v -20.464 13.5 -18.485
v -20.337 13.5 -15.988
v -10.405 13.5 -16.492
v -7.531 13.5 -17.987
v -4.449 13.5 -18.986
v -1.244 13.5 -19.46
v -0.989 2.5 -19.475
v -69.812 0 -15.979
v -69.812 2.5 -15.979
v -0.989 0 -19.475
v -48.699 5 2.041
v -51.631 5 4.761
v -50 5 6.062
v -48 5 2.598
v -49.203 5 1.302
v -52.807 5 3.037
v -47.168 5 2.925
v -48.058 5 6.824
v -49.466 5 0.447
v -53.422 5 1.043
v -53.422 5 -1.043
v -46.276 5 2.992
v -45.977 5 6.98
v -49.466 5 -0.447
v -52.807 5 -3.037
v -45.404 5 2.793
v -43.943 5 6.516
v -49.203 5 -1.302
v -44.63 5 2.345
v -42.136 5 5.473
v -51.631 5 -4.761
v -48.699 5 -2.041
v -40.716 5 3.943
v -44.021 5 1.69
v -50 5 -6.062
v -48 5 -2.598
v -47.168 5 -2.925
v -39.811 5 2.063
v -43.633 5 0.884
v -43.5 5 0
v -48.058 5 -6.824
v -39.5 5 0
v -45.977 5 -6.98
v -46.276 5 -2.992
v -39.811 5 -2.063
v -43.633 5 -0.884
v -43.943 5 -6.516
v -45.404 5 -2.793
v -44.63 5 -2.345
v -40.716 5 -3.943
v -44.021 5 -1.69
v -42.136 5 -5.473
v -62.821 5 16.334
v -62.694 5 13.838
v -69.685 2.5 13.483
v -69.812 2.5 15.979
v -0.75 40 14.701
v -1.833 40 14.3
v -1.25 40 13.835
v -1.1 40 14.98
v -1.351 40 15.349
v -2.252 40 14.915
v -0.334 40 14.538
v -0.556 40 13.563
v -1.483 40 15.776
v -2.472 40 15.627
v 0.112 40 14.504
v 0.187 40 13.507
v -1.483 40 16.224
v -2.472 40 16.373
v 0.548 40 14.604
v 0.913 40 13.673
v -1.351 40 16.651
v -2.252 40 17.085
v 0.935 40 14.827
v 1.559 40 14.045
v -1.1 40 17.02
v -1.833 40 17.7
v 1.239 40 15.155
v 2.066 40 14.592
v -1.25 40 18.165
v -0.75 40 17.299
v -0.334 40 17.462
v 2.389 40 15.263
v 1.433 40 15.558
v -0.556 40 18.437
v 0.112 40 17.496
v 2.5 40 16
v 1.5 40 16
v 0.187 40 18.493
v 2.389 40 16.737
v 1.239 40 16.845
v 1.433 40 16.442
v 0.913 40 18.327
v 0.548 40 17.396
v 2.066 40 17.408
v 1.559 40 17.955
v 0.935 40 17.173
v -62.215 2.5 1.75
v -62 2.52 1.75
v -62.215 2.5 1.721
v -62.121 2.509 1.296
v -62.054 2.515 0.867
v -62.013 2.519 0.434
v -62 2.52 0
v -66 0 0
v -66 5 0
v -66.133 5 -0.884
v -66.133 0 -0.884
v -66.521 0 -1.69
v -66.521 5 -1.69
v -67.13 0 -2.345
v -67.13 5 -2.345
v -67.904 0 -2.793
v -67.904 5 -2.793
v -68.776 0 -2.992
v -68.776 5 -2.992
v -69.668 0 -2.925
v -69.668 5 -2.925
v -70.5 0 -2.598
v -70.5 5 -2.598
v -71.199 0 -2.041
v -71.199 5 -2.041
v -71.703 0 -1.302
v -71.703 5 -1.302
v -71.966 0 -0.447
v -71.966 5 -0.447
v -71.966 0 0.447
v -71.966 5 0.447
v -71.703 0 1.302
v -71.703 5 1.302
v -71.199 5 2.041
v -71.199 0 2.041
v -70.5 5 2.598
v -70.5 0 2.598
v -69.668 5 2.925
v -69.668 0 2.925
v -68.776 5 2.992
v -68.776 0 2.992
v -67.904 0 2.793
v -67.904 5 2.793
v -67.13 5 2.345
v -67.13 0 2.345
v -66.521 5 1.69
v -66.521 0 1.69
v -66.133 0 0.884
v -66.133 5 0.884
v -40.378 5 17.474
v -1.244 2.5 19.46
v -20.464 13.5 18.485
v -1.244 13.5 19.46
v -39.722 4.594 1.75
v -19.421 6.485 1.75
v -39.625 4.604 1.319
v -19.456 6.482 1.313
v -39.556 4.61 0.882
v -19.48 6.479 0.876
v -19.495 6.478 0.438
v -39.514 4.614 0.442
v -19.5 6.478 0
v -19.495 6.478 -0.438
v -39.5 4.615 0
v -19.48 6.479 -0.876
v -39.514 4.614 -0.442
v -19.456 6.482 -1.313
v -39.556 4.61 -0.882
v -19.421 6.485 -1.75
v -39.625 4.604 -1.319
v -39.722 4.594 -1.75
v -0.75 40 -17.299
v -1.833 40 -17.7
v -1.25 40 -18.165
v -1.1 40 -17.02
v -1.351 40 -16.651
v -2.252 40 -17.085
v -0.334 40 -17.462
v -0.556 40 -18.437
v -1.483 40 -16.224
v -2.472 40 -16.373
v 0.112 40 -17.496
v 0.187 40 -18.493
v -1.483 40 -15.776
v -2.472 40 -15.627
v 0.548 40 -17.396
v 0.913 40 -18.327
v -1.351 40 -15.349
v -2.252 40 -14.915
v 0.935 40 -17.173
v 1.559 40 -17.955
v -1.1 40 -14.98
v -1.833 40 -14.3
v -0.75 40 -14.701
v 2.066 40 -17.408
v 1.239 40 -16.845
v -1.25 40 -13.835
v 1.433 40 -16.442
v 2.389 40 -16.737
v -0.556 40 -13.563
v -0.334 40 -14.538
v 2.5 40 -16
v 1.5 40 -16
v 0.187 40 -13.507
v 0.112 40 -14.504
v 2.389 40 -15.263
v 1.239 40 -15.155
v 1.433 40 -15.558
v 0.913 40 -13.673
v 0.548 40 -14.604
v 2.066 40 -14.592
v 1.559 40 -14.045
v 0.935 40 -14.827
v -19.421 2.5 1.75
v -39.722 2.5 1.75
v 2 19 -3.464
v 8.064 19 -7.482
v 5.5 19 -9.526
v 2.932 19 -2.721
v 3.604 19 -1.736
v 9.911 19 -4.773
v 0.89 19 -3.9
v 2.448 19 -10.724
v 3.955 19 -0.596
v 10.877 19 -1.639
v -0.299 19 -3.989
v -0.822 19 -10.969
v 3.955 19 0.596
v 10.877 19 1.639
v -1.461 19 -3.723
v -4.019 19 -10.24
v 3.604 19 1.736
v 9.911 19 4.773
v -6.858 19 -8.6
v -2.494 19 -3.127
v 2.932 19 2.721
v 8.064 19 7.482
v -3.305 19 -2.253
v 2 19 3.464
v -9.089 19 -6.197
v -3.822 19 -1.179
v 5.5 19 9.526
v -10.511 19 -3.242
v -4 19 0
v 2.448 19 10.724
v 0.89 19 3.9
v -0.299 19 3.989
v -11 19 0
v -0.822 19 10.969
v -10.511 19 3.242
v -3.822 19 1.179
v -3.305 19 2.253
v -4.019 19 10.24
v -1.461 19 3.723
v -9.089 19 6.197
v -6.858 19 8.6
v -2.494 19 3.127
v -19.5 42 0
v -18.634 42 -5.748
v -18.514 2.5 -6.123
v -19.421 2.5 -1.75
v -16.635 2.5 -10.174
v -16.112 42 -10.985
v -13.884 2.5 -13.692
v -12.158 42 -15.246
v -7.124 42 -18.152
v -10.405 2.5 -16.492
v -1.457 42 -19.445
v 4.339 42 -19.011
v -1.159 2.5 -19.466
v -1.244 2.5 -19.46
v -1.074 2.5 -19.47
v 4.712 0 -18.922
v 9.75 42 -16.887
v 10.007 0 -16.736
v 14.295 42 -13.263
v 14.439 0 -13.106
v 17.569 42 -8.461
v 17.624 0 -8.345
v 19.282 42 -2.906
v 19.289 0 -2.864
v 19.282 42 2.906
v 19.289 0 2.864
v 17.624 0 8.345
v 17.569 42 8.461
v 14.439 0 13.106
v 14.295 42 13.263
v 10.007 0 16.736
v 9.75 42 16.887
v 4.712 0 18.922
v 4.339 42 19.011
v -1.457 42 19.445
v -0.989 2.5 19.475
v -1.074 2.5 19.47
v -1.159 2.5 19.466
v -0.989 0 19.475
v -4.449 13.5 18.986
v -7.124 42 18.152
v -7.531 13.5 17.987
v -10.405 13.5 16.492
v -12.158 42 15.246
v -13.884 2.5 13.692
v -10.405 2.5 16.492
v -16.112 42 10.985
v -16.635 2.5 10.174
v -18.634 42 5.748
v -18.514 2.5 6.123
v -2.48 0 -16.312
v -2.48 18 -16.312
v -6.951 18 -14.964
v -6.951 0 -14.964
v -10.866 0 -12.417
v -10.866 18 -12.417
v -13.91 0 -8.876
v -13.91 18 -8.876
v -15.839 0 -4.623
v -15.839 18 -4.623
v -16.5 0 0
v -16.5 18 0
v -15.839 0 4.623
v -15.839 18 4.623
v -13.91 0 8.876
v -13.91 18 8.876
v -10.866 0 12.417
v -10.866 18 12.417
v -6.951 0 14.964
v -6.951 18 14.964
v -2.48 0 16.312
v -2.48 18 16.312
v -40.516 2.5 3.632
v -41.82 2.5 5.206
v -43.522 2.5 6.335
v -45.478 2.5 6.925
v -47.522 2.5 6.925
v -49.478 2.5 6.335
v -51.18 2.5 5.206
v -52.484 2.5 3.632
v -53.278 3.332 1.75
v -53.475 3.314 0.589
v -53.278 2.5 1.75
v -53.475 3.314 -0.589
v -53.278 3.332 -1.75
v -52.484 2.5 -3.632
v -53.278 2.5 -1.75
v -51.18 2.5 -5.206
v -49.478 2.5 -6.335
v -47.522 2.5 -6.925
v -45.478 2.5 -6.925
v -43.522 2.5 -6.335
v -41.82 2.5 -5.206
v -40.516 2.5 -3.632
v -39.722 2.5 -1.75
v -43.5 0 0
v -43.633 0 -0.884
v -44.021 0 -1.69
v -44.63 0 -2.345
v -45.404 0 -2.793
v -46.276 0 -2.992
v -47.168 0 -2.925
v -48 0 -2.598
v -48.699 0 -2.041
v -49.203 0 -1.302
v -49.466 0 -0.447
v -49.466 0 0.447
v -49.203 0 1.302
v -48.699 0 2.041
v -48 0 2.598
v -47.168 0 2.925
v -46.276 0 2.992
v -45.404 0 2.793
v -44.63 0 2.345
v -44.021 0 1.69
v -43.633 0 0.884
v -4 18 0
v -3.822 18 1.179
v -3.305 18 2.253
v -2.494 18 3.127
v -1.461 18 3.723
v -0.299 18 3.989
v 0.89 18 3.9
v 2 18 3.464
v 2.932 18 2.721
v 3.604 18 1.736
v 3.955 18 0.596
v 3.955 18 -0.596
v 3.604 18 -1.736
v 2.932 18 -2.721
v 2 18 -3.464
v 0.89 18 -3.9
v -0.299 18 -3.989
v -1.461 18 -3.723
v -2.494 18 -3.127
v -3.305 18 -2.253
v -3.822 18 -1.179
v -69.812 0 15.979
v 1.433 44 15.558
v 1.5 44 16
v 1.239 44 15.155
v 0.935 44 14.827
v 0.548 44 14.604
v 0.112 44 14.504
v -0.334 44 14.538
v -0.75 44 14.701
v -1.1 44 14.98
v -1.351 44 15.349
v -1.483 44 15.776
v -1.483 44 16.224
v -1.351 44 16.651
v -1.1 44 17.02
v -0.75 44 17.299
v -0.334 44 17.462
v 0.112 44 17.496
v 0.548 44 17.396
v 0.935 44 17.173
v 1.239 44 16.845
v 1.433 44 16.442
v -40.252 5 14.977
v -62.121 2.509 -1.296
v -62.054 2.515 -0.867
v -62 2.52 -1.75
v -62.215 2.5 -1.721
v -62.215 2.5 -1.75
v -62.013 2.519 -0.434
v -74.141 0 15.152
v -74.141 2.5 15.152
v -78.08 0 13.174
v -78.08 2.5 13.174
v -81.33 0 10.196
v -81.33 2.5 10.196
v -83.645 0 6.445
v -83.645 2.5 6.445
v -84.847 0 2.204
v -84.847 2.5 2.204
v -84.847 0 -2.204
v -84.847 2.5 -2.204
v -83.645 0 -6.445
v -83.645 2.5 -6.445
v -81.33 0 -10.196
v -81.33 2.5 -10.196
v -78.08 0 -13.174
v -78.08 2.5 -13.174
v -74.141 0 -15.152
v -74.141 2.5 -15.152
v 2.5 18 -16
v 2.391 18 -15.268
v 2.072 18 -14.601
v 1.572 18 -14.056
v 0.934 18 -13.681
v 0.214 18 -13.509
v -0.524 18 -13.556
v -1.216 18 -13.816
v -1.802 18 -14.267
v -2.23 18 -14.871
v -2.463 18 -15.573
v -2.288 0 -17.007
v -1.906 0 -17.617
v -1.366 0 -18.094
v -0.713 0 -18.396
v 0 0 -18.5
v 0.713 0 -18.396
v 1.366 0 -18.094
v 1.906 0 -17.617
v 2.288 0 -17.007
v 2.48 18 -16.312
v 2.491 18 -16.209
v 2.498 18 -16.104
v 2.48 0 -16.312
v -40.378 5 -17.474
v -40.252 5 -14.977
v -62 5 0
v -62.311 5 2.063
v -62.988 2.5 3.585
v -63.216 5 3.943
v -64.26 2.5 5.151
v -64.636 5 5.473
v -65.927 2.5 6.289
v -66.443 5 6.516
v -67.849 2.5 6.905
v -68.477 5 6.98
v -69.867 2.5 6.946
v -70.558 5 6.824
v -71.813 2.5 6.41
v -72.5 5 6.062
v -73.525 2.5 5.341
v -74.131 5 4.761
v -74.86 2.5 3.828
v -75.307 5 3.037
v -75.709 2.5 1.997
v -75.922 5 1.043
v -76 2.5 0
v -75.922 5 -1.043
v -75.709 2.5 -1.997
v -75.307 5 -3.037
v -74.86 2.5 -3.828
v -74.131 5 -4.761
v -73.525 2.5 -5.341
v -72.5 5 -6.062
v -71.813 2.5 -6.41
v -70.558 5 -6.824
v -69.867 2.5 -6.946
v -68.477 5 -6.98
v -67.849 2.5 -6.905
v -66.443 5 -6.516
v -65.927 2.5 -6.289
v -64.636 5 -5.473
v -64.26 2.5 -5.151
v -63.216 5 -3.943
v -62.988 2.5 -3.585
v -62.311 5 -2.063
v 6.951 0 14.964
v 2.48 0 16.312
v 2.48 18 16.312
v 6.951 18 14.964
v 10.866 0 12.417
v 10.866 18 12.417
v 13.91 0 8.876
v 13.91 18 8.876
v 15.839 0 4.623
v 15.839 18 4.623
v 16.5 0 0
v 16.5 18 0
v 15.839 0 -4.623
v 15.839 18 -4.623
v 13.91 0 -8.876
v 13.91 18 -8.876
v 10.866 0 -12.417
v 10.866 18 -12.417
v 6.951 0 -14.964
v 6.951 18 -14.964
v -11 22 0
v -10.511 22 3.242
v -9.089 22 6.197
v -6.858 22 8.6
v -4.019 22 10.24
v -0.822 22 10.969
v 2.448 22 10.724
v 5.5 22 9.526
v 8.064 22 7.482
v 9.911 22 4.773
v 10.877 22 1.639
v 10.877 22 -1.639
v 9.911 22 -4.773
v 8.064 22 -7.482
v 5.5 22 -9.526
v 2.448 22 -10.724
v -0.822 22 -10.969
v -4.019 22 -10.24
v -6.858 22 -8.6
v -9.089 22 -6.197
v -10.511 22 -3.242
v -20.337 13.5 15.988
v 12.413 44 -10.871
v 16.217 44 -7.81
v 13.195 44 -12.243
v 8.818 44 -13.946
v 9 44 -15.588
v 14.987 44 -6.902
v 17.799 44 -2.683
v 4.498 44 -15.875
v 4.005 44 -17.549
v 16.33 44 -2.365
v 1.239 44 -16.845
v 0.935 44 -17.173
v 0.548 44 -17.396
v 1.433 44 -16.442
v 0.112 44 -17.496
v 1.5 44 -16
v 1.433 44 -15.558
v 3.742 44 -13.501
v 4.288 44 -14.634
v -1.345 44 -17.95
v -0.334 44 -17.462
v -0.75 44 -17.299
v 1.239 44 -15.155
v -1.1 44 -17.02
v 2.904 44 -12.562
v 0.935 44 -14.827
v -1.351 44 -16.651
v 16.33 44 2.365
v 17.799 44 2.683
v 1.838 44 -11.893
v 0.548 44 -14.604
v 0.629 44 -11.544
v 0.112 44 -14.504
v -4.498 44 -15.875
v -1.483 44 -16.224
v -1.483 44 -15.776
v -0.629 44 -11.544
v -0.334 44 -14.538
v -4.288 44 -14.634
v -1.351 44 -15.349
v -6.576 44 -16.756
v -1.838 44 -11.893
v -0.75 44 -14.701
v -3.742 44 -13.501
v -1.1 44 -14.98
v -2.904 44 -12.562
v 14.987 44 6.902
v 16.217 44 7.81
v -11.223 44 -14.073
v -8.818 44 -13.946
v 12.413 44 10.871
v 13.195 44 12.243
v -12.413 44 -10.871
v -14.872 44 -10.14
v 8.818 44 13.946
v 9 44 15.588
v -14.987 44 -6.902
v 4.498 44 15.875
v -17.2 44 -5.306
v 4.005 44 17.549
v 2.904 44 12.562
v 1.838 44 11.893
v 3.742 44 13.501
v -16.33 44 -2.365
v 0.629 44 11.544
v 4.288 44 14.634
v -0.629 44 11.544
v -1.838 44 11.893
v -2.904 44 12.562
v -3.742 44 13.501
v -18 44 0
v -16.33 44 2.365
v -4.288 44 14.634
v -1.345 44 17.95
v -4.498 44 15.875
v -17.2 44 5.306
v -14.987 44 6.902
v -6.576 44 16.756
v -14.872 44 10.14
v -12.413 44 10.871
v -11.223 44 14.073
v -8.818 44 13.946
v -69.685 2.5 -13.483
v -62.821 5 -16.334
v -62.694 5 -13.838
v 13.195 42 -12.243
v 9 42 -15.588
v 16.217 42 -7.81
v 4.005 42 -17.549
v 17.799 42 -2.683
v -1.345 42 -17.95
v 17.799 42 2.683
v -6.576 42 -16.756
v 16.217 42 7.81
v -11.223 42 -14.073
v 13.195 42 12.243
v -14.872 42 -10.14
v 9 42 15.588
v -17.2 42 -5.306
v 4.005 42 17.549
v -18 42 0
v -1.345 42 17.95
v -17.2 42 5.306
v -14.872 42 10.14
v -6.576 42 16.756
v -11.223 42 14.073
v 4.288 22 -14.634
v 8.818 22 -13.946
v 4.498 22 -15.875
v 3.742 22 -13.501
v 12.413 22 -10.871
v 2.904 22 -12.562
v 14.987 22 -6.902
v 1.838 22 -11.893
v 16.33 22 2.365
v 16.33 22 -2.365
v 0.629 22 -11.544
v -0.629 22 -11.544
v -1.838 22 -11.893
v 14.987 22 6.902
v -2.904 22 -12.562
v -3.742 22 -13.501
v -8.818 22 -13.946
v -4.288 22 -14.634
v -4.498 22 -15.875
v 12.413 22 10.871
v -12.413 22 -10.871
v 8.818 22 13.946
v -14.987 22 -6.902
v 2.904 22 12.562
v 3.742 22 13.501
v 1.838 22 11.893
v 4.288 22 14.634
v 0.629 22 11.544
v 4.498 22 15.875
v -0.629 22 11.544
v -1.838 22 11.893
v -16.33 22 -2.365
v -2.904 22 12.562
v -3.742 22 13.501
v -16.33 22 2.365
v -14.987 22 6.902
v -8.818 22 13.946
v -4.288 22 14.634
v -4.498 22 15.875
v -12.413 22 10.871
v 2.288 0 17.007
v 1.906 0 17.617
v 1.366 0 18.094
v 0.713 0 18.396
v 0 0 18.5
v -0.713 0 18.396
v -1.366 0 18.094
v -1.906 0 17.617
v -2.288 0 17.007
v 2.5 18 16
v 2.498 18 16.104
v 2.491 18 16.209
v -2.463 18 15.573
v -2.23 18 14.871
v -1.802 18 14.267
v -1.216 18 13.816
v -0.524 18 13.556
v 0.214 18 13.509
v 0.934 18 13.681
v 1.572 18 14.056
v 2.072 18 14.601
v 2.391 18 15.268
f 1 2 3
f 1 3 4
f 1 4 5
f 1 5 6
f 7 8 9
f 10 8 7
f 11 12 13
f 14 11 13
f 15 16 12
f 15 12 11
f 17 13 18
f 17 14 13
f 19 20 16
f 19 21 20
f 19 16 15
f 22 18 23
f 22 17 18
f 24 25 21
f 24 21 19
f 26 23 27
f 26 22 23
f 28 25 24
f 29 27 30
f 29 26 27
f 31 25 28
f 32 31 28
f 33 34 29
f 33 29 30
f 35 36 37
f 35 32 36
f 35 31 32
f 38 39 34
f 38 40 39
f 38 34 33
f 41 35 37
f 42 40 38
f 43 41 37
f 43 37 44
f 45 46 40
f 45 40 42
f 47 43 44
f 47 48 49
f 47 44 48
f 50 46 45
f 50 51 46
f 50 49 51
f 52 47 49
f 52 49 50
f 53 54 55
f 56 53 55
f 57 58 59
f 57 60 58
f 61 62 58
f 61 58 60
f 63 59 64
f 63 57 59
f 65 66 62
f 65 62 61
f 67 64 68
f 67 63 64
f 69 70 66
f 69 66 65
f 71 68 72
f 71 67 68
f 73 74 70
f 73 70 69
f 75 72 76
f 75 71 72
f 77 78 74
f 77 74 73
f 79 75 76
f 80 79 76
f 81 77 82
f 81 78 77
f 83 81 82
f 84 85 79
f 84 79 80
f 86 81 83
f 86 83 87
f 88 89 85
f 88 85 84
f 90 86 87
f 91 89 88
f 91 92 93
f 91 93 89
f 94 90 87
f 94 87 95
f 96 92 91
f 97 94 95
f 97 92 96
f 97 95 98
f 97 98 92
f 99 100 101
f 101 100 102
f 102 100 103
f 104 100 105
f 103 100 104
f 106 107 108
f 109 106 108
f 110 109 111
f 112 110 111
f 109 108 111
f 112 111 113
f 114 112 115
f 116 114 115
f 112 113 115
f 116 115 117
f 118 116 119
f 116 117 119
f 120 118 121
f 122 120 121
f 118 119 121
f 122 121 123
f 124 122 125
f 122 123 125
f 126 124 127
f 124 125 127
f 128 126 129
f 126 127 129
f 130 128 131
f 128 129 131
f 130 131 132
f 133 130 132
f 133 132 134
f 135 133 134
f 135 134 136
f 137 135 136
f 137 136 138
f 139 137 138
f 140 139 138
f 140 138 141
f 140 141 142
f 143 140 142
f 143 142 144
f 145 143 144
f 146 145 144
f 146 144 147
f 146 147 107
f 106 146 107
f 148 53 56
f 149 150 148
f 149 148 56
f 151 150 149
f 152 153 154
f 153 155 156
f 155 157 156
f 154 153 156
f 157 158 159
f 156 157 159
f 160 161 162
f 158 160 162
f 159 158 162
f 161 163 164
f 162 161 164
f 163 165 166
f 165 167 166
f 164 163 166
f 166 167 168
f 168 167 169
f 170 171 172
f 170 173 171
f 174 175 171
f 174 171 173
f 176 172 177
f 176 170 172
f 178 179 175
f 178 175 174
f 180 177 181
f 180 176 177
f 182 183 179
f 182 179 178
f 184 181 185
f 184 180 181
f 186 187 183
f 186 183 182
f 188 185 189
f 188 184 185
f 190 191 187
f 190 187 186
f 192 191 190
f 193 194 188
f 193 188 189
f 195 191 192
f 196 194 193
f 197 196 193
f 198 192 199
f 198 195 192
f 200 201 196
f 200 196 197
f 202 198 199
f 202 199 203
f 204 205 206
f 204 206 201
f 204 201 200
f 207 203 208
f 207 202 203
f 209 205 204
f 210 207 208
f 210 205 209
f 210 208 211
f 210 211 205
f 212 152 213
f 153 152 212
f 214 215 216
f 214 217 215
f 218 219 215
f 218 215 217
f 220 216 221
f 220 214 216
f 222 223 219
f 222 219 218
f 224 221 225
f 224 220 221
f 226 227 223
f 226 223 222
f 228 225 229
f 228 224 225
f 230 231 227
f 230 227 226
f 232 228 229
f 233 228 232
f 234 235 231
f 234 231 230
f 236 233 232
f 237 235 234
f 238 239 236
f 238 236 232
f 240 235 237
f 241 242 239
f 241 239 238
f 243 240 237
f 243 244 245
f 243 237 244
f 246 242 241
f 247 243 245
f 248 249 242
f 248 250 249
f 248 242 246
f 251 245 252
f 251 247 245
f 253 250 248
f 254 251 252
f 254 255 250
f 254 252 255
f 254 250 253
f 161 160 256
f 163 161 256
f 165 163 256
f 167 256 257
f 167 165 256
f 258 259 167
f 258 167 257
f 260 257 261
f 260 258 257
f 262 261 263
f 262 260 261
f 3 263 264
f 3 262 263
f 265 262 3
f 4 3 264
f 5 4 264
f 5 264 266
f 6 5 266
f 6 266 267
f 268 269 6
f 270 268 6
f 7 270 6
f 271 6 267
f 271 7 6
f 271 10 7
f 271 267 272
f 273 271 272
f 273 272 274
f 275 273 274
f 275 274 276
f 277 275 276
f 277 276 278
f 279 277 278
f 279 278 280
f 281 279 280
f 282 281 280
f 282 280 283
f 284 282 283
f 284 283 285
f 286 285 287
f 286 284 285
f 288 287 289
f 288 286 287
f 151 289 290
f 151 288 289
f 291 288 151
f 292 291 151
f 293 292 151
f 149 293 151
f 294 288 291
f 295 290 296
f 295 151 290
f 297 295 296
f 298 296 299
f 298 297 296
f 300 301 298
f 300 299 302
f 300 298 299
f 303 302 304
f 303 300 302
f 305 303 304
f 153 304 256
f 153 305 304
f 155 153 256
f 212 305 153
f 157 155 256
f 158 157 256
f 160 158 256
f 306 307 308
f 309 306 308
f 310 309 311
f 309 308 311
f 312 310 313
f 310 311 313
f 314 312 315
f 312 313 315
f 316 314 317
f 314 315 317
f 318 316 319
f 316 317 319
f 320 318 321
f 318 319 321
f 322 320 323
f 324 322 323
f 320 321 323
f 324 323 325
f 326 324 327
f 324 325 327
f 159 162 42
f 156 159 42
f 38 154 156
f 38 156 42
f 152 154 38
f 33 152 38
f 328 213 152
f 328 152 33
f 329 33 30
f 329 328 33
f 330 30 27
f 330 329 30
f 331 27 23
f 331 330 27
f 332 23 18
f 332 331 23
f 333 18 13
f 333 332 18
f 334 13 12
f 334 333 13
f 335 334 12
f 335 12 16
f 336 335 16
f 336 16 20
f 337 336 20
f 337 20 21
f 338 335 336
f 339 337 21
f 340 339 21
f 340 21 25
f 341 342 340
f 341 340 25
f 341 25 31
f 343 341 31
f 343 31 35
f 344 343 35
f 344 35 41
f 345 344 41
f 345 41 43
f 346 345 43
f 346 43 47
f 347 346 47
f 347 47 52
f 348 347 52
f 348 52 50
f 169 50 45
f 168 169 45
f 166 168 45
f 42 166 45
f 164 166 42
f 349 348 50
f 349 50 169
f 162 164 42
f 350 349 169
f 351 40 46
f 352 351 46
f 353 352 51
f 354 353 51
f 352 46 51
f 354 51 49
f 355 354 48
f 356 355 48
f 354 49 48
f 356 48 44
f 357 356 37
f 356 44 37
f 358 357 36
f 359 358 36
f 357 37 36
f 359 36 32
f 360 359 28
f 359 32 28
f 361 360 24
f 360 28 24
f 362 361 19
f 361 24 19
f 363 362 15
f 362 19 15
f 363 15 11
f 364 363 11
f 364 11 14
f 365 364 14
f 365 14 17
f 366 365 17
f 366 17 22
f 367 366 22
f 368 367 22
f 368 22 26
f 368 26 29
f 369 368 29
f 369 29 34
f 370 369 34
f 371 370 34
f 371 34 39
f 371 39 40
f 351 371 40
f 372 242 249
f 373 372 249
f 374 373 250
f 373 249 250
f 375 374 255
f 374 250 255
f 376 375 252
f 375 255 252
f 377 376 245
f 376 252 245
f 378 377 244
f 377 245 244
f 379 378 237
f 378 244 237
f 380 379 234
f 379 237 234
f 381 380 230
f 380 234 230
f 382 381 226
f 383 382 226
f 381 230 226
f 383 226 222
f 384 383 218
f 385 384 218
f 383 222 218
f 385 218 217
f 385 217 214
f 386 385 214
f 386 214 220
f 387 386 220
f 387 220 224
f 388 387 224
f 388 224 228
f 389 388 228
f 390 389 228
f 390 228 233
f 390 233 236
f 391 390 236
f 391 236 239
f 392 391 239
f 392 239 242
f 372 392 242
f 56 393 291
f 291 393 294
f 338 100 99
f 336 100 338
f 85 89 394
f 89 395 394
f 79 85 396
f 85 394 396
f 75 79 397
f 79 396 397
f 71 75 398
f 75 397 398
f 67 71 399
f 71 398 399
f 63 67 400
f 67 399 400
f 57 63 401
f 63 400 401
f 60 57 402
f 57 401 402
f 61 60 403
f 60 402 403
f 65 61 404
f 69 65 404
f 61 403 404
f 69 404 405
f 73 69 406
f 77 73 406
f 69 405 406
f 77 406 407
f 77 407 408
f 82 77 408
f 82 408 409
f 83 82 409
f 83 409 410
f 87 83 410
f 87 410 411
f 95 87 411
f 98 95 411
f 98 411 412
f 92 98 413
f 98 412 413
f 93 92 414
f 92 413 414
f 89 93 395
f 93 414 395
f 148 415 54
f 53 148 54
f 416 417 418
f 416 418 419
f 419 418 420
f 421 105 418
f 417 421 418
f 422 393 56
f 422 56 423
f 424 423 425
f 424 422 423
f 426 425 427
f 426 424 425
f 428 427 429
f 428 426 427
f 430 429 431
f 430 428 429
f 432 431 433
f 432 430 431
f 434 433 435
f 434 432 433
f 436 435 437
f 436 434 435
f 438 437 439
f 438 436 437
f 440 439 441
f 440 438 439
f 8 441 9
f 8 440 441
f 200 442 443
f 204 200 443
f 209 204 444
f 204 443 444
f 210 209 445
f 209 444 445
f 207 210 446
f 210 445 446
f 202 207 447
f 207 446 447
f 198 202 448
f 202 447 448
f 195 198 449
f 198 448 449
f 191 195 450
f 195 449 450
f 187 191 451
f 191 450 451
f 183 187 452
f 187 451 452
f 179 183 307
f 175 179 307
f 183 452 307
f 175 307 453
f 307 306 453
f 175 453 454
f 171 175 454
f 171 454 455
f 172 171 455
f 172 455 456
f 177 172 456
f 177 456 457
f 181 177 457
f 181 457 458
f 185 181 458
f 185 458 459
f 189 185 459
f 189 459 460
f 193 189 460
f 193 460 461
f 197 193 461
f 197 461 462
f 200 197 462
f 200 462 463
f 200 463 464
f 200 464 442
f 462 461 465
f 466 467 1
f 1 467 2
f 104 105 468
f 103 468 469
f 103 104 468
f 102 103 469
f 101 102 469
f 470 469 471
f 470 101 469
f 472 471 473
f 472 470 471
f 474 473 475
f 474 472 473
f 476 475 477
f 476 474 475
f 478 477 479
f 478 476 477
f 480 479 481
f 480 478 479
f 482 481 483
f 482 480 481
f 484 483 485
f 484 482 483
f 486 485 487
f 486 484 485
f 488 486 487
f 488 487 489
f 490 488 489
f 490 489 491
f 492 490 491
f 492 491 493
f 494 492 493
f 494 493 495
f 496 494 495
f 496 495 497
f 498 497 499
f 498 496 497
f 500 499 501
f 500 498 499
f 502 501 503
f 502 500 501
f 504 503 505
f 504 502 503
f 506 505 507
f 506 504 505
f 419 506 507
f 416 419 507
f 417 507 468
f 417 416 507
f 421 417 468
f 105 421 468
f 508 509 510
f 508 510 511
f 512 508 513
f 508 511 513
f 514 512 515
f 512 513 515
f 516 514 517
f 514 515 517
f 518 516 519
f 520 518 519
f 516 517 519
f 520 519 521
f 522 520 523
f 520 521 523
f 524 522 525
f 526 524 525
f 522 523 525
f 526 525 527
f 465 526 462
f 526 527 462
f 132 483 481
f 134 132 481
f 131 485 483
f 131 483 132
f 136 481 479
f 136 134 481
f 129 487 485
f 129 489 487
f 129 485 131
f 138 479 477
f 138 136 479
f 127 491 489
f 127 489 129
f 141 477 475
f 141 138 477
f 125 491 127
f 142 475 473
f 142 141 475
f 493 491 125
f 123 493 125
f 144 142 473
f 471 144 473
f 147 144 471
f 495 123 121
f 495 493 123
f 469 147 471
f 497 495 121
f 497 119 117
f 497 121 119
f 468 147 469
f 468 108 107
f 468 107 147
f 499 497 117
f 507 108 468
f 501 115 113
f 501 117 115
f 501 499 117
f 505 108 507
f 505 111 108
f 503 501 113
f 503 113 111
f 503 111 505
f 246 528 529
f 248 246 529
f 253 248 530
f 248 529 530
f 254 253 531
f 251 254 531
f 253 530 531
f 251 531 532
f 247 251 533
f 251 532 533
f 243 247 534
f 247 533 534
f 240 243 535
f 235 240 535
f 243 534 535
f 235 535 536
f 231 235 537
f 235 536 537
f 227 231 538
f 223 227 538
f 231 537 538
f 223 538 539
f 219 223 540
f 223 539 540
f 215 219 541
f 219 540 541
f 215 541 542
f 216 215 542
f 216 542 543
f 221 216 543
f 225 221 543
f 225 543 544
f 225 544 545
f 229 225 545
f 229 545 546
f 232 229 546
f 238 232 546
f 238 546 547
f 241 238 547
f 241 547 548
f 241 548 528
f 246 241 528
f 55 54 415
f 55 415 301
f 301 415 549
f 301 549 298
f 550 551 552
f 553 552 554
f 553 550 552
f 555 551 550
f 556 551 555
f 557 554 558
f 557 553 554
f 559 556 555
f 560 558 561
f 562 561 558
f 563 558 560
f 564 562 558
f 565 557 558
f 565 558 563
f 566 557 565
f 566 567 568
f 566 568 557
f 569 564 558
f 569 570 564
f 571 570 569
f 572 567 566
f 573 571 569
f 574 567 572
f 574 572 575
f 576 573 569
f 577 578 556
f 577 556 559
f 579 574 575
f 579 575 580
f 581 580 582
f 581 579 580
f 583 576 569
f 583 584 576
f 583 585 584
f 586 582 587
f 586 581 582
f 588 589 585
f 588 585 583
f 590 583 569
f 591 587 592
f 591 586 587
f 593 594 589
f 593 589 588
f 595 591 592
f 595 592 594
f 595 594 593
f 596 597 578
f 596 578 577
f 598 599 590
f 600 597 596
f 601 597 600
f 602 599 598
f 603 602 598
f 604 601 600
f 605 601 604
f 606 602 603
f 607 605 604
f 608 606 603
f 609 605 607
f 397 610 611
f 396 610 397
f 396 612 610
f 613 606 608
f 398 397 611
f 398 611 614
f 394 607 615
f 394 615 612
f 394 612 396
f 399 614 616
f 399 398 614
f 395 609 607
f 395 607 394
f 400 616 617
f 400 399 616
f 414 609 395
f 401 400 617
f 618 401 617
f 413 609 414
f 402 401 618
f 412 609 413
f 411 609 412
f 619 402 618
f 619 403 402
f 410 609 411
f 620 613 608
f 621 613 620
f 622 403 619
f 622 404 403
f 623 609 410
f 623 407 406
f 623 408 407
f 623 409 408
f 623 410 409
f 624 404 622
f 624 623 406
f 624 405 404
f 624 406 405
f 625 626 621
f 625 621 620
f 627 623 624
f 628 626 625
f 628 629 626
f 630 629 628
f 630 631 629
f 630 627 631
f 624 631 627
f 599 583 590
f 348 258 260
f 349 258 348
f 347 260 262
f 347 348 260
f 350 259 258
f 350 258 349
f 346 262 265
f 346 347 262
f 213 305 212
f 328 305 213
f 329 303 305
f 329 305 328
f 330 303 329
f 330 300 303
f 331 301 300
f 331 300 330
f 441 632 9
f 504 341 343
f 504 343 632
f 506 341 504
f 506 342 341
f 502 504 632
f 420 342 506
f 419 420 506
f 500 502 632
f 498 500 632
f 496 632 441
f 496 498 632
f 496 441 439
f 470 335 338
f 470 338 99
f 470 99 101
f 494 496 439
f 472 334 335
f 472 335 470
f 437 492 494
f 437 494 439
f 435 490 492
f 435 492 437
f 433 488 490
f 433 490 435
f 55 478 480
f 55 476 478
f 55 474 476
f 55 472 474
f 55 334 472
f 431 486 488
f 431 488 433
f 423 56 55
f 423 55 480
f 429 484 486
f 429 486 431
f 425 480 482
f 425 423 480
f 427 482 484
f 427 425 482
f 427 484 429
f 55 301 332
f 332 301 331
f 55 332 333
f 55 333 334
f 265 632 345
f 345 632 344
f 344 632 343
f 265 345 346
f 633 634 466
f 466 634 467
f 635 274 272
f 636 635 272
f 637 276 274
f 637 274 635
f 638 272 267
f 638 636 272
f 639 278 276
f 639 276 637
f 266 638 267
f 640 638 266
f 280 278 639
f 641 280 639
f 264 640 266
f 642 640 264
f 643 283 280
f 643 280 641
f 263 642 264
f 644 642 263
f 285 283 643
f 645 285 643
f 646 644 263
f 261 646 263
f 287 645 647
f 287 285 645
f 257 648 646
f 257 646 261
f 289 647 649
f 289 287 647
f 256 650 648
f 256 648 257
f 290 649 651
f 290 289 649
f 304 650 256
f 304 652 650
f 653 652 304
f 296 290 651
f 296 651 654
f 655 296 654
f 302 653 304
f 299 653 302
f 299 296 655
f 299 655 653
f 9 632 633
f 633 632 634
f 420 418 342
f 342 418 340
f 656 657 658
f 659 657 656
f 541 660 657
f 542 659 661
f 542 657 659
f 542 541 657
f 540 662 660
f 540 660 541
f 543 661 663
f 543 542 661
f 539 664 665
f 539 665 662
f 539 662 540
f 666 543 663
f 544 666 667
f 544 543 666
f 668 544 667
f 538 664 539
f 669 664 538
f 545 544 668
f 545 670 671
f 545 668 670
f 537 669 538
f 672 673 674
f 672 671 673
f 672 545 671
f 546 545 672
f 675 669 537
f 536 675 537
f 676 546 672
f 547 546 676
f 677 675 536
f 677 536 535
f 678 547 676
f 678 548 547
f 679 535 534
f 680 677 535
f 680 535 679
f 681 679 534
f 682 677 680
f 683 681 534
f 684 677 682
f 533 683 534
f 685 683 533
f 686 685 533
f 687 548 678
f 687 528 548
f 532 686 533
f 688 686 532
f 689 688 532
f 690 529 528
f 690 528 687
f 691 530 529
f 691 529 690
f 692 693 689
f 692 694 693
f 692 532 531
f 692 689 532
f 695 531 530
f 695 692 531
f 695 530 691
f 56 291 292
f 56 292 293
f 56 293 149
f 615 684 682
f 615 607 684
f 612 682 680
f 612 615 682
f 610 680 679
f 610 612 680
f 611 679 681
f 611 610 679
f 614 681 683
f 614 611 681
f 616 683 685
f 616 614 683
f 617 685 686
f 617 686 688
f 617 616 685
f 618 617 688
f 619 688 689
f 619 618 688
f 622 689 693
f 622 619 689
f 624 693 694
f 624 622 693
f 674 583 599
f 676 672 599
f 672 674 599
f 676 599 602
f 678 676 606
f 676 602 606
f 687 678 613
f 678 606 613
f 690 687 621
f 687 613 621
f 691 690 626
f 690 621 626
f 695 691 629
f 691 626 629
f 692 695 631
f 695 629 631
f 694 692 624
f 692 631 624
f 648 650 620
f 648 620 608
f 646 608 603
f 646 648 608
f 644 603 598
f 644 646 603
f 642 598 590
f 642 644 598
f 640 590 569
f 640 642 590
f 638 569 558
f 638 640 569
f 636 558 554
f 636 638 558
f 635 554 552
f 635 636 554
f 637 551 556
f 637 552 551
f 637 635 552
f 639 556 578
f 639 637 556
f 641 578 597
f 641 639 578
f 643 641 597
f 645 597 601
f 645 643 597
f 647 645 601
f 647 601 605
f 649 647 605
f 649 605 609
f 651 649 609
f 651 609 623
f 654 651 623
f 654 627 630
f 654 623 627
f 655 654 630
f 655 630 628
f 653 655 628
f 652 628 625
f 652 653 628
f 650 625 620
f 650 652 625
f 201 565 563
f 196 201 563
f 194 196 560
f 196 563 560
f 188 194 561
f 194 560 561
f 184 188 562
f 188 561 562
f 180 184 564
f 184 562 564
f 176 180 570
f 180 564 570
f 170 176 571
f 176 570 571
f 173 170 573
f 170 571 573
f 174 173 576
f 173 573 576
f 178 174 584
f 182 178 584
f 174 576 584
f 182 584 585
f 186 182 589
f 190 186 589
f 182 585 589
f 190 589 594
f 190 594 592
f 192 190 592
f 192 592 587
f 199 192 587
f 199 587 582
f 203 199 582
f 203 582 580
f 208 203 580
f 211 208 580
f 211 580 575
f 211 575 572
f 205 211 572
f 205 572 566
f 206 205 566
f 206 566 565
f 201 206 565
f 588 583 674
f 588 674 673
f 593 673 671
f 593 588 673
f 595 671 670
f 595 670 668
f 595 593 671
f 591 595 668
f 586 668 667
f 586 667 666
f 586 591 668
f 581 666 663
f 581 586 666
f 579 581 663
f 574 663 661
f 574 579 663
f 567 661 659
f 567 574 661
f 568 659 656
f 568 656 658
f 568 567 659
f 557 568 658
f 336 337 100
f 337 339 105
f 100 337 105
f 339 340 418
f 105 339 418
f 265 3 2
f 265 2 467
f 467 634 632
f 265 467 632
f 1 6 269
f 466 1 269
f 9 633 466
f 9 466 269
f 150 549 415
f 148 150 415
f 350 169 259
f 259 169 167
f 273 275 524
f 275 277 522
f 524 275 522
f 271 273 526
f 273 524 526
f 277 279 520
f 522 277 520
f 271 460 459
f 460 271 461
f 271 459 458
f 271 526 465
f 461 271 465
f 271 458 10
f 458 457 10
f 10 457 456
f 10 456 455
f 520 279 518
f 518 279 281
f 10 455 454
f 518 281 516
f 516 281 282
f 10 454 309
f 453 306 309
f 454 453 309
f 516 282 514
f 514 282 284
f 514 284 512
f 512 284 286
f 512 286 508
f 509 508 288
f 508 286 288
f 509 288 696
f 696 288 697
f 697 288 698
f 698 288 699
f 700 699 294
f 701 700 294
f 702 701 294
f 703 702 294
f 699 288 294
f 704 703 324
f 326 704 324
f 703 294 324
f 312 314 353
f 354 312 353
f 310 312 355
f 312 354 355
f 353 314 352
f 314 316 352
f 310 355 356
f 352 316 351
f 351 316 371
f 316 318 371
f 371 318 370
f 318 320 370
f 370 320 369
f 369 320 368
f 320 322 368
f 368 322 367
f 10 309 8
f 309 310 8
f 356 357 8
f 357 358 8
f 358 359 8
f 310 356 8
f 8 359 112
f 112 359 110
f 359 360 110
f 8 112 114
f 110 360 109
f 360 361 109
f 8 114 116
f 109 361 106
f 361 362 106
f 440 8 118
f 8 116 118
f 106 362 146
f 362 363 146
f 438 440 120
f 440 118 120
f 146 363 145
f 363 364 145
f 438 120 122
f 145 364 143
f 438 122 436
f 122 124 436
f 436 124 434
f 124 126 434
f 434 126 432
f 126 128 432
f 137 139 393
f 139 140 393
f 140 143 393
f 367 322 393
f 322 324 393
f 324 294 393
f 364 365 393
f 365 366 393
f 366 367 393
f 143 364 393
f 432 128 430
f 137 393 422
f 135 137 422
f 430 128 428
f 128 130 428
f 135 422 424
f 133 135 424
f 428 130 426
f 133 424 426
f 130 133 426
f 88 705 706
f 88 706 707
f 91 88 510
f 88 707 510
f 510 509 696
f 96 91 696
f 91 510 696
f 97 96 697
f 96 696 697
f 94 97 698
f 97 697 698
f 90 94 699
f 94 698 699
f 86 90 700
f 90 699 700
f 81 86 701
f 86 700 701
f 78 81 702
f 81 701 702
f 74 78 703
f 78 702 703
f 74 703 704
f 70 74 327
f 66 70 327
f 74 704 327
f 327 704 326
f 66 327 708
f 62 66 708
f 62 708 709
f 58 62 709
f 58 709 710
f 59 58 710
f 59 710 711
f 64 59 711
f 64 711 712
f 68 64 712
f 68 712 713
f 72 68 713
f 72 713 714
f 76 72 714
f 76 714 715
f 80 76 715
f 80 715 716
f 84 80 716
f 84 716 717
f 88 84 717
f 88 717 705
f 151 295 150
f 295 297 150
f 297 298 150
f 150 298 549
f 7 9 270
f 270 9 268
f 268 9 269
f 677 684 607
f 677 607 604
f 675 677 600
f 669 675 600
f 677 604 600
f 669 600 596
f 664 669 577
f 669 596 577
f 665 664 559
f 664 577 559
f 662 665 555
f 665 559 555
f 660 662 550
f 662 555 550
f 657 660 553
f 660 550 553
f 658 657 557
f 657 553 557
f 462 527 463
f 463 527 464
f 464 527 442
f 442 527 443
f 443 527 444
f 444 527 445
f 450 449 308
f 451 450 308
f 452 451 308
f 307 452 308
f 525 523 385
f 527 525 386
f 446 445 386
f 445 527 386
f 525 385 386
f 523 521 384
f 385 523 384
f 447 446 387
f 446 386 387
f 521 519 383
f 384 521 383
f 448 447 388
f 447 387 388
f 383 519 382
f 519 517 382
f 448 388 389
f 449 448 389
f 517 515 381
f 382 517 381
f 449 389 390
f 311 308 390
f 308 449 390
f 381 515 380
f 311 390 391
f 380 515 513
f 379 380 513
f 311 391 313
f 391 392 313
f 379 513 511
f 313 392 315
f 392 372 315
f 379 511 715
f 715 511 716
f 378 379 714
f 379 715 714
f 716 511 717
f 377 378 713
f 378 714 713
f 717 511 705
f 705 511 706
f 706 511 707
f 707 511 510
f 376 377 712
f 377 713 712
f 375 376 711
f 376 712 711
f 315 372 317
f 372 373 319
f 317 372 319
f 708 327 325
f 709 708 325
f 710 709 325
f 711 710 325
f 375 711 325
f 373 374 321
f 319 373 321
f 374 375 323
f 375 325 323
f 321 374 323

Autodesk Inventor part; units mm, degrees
ref_plane "YZ Plane" through (0, 0, 0) normal (1, 0, 0) x (0, 1, 0)
ref_plane "XZ Plane" through (0, 0, 0) normal (0, 1, 0) x (-1, 0, 0)
sketch "Sketch1" plane through (0, 0, 0) normal (0, 1, 0) x (-1, 0, 0)
  circle A0 centre (0, 0) radius 19.5
  line L0 (0, 0) -> (69, 0) construction
  circle A1 centre (69, 0) radius 16
  line L1 (69.8116, -15.9794) -> (0.9891, -19.4749)
  line L2 (69.8116, 15.9794) -> (0.9891, 19.4749)
  point P0 (0.9891, 19.4749)
  dimension "d0" = 39
  dimension "d1" = 32
  dimension "d2" = 69
extrude "Extrusion1" add sketch "Sketch1" along normal blind 2.5 contours A0 L2 A1 L1 | A1
sketch "Sketch3" plane through (0, 0, 0) normal (0, 0, 1) x (1, 0, 0)
  line L0 (0, 0) -> (0, 29.1077)
  line L1 (0, 22) -> (-16.5, 22)
  line L2 (-16.5, 22) -> (-16.5, 44)
  line L3 (-16.5, 44) -> (-19.5, 44)
  line L4 (-19.5, 44) -> (-19.5, 2.5)
  line L5 (-19.5, 2.5) -> (-0.9891, 2.5) projected
  line L6 (-19.5, 2.5) -> (-19.5, 0)
  line L7 (-19.5, 0) -> (-16.5, 0)
  line L8 (-19.5, 0) -> (-0.9891, 0) projected
  line L9 (-16.5, 0) -> (-16.5, 18)
  line L10 (-16.5, 18) -> (0, 18)
  line L11 (-18, 44) -> (-18, 42)
  line L12 (-18, 42) -> (-19.5, 42)
  line L13 (-4, 18) -> (-4, 19)
  line L14 (-4, 19) -> (-11, 19)
  line L15 (-11, 19) -> (-11, 22)
  point P0 (-16.5, 2.5)
  dimension "d5" = 44
  dimension "d6" = 2
  dimension "d7" = 18
  dimension "d8" = 16.5
  dimension "d10" = 4
  dimension "d11" = 3
  dimension "d12" = 22
  dimension "d13" = 11
  dimension "d14" = 1
revolve "Revolution1" add sketch "Sketch3" angle 360 about axis through (0, 0, 0) along (0, 1, 0) contours L10 L9 L5 L4 L12 L11 L3 L2 L1 L15 L14 L13 | L9 L7 L6 L5
sketch "Sketch4" plane through (0, 2.5, 0) normal (0, 1, 0) x (1, 0, 0)
  line L0 (0, 0) -> (-85, 0)
  arc A0 (-69.8116, 15.9794) -> (-69.8116, -15.9794) centre (-69, 0) ccw projected
  circle A1 centre (-46.5, 0) radius 7
  circle A2 centre (-69, 0) radius 7
  dimension "d17" = 46.5
  dimension "d18" = 22.5
  dimension "d19" = 14
extrude "Extrusion2" add sketch "Sketch4" along normal blind 2.5
ref_plane "Work Plane1" through (-69.6848, 0, 13.4826) normal (-0.0507, 0, 0.9987) x (0.9987, 0, 0.0507)
sketch "Sketch6" plane through (-69.6848, 0, 13.4826) normal (-0.0507, 0, 0.9987) x (0.9987, 0, 0.0507)
  line L0 (68.9112, 0) -> (68.9112, 13.5)
  line L1 (68.9112, 13.5) -> (49.4112, 13.5)
  line L2 (49.4112, 13.5) -> (29.471, 5)
  line L3 (29.471, 5) -> (7, 5)
  line L4 (7, 5) -> (0, 2.5)
  line L5 (66.9355, 2.5) -> (-1.6211, 2.5) projected
  line L6 (29.471, 2.5) -> (29.471, 5) projected
  line L7 (7, 2.5) -> (7, 5) projected
  line L8 (49.4112, 2.5) -> (49.4112, 42) projected
  line L9 (7, 5) -> (-7, 5) projected
  line L10 (0, 5) -> (0, 18.3194) construction
  line L11 (66.9355, 0) -> (-1.6211, 0) projected
  line L12 (66.9355, 2.5) -> (68.9112, 2.5)
  dimension "d23" = 13.5
  dimension "d24" = 5
extrude "Extrusion3" add sketch "Sketch6" along normal blind 2.5
mirror "Mirror1" about plane through (0, 0, 0) normal (0, 0, 1) of "Extrusion3"
sketch "Sketch7" plane through (0, 0, 0) normal (0, 0, 1) x (1, 0, 0)
  line L0 (-17.1617, 6.6953) -> (-62, 2.52)
  line L1 (-62, 2.5) -> (-62, 5) projected
  line L2 (-62, 2.52) -> (-62, 2.5)
  line L3 (-10.4025, 2.5) -> (-69.6848, 2.5) projected
  line L4 (-17.1617, 2.5) -> (-62, 2.5)
  line L5 (-17.1617, 2.5) -> (-17.1617, 6.6953)
  line L6 (-0.9891, 0) -> (-69.8116, 0) projected
  line L7 (-62, 2.52) -> (-62.2148, 2.5)
  point P0 (0, 0)
  dimension "d27" = 5.32
  dimension "d28" = 2.52
extrude "Extrusion4" add sketch "Sketch7" along normal mid plane 3.5
sketch "Sketch8" plane through (-46.5, 5, 0) normal (0, 1, 0) x (1, 0, 0)
  arc A0 (-6.7777, -1.75) -> (6.7777, -1.75) centre (0, 0) ccw projected
  circle A1 centre (0, 0) radius 3
  arc A2 (-15.7148, 1.7207) -> (-15.7148, -1.7207) centre (-22.5, 0) ccw projected
  circle A3 centre (-22.5, 0) radius 3
  point P0 (46.5, 0)
  point P1 (-15.5, 0)
  dimension "d31" = 6
extrude "Extrusion5" cut sketch "Sketch8" against normal through all
sketch "Sketch9" plane through (0, 44, 0) normal (0, 1, 0) x (1, 0, 0)
  circle A0 centre (0, -16) radius 4.5
  line L0 (0, 0) -> (24.199, 0) construction
  circle A1 centre (0, 0) radius 16.5 projected
  circle A2 centre (0, 16) radius 4.5
  point P0 (-4.4983, 15.875)
  point P1 (4.4983, 15.875)
  point P2 (-4.4983, -15.875)
  point P3 (4.4983, -15.875)
  dimension "d34" = 9
  dimension "d35" = 16
extrude "Extrusion6" add sketch "Sketch9" against normal up to surface (22 mm away) contours A1 A0 | A1 A2 picked at (-0.1776, -14.7973) picked at (-0.1776, 14.7973)
sketch "Sketch10" plane through (0, 44, 0) normal (0, 1, 0) x (1, 0, 0)
  arc A0 (4.4983, -15.875) -> (-4.4983, -15.875) centre (0, -16) ccw projected
  circle A1 centre (0, -16) radius 1.5
  line L0 (0, 0) -> (9.3395, 0) construction
  circle A2 centre (0, 16) radius 1.5
  dimension "d38" = 3
extrude "Extrusion7" cut sketch "Sketch10" against normal blind 4
sketch "Sketch11" plane through (0, 0, 0) normal (0, -1, 0) x (1, 0, 0)
  circle A0 centre (0, 16) radius 1.5 projected
  circle A1 centre (0, 16) radius 2.5
  line L0 (0, 0) -> (10.318, 0)
  circle A2 centre (0, -16) radius 2.5
  dimension "d41" = 5
extrude "Extrusion8" cut sketch "Sketch11" against normal up to surface (40 mm away) contours A0 | A1 | A2
sketch "Sketch12" plane through (0, 44, 0) normal (0, 1, 0) x (1, 0, 0)
  line L0 (36.079, 0) -> (-96.4154, 0)
  line L1 (-96.4154, 0) -> (-96.4154, 28.1723)
  line L2 (-96.4154, 28.1723) -> (36.079, 28.1723)
  line L3 (36.079, 28.1723) -> (36.079, 0)
  point P0 (0, 0)
properties part number "pt1" material "Stainless Steel"
